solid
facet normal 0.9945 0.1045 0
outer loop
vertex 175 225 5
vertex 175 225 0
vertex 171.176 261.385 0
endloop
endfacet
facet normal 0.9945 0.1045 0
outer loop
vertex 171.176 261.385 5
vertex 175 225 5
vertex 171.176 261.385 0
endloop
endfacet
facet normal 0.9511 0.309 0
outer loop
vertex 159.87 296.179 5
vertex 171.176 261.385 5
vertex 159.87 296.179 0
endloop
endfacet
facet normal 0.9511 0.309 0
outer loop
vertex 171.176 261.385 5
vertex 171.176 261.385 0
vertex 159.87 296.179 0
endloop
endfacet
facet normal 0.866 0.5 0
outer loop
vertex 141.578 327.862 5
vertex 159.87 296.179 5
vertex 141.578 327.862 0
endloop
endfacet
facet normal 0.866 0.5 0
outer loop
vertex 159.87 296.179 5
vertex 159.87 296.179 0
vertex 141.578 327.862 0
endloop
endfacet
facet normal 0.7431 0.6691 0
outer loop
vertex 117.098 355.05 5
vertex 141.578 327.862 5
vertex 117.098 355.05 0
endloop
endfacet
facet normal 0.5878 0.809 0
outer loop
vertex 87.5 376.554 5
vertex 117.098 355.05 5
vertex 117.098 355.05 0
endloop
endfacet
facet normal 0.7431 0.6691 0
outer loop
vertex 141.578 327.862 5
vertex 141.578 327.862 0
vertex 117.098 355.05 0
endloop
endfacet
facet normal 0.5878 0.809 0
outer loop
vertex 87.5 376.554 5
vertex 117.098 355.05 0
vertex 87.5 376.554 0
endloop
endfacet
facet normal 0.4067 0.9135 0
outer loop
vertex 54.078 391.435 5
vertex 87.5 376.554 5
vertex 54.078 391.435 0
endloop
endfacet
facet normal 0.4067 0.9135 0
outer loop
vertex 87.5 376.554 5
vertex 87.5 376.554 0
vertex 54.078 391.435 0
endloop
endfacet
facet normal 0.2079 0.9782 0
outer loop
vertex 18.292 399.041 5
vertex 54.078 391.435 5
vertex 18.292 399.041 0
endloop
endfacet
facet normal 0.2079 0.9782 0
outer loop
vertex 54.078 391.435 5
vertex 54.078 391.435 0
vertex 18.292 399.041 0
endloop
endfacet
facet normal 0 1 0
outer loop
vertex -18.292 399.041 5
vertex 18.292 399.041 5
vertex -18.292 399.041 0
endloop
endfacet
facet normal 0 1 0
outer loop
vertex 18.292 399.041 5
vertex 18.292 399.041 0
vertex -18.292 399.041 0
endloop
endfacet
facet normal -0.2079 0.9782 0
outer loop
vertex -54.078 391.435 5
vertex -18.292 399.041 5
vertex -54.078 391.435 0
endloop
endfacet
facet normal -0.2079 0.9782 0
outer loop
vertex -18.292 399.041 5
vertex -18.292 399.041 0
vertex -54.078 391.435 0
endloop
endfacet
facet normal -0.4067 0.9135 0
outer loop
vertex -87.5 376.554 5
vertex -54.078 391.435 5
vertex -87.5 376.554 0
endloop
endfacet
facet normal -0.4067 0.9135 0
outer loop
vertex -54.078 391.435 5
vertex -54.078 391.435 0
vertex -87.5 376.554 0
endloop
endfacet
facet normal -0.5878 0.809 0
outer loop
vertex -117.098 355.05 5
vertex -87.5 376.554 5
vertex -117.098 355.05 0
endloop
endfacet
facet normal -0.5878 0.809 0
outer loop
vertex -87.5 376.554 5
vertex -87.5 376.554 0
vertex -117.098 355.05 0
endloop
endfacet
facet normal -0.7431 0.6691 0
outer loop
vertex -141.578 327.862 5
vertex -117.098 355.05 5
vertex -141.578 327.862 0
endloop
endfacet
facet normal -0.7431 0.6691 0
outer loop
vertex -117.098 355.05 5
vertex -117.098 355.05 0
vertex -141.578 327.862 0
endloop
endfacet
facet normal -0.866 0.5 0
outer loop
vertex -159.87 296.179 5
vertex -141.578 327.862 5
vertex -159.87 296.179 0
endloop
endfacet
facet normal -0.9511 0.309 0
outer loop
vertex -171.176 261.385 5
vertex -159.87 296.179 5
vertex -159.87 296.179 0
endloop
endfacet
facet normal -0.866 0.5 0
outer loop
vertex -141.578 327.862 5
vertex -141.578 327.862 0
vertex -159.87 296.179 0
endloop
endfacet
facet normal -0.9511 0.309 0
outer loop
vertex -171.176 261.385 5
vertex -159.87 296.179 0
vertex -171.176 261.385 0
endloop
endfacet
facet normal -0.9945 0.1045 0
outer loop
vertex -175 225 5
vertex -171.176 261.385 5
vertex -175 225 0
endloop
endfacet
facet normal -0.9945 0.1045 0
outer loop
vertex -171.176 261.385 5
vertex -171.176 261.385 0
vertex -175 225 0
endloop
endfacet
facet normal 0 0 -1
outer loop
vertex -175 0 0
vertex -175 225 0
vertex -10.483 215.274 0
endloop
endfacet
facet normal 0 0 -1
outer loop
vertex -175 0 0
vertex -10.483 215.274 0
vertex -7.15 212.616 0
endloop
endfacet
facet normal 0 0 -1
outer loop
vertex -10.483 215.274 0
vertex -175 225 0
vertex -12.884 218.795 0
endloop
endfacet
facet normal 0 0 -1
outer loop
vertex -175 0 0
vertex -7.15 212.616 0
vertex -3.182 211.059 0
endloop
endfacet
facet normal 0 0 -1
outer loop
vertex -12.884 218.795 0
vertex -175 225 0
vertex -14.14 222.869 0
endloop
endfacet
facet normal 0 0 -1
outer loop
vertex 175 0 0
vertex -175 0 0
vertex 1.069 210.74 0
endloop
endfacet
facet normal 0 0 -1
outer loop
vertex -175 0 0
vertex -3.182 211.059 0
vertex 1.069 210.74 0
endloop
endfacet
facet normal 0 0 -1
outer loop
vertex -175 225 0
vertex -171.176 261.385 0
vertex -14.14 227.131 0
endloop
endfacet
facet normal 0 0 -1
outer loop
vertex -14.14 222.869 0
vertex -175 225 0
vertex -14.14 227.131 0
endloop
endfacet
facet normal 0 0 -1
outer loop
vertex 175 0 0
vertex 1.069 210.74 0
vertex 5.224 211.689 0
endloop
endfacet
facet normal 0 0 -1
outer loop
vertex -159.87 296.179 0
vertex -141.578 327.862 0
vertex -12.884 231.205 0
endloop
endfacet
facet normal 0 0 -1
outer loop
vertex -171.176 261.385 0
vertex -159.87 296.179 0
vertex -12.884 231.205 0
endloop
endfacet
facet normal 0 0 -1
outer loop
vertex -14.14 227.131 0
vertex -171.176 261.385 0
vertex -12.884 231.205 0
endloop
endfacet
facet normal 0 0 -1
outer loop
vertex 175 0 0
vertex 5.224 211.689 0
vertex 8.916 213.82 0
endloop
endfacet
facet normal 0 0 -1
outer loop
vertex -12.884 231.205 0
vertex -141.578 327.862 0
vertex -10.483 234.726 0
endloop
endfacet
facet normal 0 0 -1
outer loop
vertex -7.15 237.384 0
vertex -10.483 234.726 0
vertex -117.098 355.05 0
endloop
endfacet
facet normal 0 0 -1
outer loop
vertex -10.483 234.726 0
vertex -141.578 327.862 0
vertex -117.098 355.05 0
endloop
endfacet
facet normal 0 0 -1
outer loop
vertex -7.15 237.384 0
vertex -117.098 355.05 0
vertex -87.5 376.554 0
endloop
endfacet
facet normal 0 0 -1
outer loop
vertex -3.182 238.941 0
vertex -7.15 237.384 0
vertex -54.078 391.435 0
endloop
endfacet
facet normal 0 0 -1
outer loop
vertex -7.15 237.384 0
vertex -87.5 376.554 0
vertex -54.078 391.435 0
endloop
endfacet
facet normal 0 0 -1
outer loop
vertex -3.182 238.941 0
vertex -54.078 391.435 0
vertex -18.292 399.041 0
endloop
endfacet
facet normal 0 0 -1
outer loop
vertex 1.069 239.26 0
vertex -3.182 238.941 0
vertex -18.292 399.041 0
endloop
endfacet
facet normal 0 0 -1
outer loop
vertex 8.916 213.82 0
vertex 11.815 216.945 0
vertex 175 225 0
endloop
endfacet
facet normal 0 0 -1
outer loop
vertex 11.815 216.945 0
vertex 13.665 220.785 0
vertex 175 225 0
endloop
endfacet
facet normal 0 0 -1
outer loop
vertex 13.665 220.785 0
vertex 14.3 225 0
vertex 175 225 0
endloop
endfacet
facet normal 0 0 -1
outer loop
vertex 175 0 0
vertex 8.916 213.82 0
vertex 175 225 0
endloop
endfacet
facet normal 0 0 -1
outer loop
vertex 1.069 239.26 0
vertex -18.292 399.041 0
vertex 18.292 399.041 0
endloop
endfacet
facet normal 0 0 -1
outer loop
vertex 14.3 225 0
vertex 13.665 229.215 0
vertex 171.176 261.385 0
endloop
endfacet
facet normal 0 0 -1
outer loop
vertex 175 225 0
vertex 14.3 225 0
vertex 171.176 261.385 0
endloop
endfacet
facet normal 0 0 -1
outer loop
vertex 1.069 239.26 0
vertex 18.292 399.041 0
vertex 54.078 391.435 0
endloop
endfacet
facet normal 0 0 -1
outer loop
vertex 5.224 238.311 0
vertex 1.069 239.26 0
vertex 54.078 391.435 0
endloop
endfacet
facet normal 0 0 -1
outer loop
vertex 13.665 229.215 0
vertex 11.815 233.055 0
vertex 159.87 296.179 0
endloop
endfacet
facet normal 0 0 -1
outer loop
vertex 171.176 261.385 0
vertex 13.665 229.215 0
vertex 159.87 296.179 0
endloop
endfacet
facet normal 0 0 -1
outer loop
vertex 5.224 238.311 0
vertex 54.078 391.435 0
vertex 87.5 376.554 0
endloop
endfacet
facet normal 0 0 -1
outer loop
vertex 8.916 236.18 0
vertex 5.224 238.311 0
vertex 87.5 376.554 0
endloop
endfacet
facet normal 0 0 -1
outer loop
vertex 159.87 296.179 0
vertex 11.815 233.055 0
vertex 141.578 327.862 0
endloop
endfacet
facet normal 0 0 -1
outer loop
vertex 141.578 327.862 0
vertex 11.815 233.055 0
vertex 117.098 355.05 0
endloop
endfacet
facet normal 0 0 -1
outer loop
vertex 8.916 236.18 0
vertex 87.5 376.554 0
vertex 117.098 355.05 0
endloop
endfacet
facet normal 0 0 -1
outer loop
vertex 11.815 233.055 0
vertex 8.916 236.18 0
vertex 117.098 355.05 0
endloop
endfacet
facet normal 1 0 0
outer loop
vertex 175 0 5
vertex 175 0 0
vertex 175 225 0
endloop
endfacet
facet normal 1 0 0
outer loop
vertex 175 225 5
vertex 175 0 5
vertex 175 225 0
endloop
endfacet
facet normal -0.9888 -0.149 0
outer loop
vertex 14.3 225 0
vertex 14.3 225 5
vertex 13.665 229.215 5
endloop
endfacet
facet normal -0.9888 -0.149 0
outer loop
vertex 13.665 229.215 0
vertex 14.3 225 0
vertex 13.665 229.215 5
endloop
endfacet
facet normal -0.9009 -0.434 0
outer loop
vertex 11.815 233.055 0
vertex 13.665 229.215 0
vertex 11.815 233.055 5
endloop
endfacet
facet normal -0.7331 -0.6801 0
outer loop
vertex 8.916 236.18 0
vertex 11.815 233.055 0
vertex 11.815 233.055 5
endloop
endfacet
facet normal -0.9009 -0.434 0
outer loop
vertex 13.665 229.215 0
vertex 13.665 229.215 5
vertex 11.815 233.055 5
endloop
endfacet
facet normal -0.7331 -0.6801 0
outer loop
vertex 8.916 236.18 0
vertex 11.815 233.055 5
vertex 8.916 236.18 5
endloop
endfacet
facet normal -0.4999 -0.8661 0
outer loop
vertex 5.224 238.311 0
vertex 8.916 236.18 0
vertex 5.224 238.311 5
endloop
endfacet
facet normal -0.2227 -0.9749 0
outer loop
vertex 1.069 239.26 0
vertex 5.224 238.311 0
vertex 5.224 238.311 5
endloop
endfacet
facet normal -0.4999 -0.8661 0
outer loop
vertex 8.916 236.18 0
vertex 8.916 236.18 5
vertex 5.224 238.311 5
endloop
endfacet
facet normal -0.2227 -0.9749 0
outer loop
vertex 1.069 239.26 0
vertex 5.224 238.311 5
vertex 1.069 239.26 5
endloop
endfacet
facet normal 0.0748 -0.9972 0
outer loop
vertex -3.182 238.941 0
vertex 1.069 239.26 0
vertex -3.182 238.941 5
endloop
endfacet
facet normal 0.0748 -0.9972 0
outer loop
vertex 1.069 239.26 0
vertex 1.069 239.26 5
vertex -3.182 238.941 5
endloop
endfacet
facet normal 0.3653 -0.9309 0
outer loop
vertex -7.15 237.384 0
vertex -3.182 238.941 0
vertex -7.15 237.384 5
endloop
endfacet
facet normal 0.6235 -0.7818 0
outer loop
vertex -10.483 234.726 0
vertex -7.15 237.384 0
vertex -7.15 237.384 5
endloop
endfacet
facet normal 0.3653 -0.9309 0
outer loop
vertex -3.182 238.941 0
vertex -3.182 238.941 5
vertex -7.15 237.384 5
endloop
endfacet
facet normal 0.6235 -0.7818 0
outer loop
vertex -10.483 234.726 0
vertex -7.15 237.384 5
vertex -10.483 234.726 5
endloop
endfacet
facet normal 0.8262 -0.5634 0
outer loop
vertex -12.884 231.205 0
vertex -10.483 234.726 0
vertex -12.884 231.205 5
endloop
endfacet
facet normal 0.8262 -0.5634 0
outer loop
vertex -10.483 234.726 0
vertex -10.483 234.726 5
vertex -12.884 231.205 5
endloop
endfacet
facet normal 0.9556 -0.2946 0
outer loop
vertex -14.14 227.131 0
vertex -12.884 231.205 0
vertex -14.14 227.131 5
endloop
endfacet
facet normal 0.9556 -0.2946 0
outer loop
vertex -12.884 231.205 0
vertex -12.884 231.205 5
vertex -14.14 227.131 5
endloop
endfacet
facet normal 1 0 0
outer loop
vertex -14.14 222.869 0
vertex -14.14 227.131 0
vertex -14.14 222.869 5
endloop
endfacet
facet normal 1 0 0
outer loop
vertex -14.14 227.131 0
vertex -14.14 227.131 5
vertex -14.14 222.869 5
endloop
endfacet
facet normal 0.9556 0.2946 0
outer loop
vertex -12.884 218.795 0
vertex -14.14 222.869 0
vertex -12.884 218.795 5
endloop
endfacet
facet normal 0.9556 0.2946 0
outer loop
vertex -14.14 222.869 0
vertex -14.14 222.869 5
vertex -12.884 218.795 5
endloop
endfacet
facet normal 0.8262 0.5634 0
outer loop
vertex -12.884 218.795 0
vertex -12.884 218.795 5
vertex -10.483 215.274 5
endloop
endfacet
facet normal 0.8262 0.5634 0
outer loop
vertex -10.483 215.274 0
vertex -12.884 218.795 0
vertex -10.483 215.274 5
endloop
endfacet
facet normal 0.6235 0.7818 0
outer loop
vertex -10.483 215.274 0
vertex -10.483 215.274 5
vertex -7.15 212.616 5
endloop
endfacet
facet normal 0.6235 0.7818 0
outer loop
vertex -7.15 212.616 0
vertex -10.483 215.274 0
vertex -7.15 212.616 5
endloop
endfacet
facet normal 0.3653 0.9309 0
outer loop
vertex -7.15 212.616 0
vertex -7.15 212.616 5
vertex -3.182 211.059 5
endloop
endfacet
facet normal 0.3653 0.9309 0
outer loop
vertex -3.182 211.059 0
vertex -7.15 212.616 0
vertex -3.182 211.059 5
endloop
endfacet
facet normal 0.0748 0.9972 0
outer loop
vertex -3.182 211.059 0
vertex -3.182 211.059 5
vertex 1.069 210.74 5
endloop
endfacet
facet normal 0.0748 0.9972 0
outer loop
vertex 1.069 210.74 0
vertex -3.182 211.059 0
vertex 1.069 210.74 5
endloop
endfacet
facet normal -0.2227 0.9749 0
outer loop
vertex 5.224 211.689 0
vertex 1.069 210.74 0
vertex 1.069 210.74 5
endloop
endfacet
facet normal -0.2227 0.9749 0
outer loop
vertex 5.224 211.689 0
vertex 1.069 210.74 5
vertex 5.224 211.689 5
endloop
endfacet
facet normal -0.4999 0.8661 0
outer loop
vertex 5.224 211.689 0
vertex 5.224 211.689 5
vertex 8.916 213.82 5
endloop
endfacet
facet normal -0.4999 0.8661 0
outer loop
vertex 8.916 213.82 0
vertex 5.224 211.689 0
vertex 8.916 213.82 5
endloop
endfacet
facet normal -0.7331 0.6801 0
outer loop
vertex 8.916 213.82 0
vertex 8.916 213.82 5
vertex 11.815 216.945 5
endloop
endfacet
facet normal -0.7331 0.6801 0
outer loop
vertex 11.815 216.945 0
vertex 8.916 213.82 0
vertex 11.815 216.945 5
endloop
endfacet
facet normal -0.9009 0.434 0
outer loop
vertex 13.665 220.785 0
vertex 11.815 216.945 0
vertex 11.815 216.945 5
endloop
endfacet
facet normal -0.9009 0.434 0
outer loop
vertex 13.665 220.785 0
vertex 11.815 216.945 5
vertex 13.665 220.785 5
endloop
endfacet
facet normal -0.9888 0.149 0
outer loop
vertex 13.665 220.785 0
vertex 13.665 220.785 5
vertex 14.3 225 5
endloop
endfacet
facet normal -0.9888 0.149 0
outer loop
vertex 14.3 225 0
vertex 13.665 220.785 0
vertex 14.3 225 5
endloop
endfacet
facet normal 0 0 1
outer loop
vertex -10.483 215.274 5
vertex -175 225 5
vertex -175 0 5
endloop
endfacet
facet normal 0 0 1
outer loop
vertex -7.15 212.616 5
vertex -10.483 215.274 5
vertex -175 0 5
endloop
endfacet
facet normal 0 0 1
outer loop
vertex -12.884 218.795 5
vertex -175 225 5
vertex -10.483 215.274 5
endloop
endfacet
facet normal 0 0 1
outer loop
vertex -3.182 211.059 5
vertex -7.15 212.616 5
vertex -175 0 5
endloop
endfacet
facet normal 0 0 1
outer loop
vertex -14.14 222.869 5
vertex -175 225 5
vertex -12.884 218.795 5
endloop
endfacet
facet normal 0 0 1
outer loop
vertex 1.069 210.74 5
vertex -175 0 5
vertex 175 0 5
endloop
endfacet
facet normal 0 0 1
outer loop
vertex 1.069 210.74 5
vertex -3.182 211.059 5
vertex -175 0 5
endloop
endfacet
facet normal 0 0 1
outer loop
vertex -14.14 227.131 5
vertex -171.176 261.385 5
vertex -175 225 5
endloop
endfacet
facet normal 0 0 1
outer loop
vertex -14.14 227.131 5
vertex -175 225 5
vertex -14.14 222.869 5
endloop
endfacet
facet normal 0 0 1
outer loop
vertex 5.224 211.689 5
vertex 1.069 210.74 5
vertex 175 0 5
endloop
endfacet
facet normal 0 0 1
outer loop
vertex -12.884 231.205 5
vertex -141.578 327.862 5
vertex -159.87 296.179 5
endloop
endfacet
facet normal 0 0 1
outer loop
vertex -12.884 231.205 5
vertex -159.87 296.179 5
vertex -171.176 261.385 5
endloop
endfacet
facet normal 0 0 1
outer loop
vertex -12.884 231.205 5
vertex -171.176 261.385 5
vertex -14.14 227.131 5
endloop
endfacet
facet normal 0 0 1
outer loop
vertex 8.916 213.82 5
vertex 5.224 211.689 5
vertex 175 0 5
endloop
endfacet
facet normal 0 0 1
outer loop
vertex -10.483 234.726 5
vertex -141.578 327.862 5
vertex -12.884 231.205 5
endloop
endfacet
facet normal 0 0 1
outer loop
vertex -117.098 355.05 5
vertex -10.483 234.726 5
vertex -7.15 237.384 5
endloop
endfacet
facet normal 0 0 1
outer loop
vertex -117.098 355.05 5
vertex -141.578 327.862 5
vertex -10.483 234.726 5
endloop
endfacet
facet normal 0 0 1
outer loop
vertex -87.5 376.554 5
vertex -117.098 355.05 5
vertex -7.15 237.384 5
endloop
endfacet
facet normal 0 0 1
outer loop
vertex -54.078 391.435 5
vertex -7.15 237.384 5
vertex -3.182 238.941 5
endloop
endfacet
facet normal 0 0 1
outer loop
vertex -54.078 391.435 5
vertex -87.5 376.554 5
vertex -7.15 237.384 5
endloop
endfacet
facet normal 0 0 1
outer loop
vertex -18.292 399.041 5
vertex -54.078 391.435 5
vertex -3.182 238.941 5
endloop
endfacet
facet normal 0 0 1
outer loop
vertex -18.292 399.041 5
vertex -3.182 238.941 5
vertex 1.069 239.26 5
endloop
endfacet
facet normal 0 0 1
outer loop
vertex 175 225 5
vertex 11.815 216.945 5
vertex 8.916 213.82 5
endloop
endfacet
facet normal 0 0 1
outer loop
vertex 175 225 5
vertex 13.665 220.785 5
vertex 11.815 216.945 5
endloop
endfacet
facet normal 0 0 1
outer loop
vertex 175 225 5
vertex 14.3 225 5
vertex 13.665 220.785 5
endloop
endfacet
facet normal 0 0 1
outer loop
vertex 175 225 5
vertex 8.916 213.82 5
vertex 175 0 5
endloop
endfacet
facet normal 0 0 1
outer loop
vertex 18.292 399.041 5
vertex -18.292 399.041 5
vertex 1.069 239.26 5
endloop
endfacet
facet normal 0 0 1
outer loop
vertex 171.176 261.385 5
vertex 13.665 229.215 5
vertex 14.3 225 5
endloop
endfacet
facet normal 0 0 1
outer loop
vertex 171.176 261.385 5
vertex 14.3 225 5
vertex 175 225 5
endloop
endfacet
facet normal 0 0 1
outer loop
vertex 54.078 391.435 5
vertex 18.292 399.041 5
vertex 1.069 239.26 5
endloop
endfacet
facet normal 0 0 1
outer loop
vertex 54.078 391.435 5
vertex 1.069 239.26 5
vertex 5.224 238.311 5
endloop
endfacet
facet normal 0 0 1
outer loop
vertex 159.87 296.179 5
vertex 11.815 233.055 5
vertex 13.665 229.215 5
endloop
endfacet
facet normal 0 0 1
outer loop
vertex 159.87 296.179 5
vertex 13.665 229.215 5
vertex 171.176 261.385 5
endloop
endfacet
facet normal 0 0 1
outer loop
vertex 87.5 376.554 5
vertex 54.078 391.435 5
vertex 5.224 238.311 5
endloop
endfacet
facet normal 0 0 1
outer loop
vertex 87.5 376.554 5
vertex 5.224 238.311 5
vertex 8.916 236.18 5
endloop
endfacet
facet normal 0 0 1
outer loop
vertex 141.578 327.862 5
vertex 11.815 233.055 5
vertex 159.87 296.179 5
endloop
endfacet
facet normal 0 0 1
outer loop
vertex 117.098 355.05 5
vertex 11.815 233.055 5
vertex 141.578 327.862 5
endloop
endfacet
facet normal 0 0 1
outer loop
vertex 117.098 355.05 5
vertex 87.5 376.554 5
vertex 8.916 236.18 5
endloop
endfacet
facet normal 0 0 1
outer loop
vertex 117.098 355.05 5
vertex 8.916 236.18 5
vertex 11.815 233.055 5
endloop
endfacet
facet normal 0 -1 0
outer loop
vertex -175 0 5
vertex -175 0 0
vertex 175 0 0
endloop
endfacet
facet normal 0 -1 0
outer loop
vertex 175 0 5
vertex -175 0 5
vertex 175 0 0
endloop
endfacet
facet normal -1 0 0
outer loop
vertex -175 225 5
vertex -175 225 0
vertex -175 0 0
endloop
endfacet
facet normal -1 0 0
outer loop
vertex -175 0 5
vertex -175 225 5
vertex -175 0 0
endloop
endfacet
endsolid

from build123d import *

# Parameters (mm, degrees)
OUTER_CASING_DEPTH = 5
SKETCH1_R          = 14.3
INNER_CUTOUT_DEPTH = 10


with BuildPart() as part:
    # Plate shape → Outer casing (new body)
    with BuildSketch(Plane.XY):
        with BuildLine():
            Line((-175, 225), (-175, 0))
            Line((-175, 0), (175, 0))
            Line((175, 0), (175, 225))
            ThreePointArc((175, 225), (0, 400), (-175, 225))
        make_face()
    extrude(amount=OUTER_CASING_DEPTH)

    # Sketch1 → Inner Cutout (cut)
    with BuildSketch(Plane.XY.offset(5)):
        with Locations((0, 225)):
            Circle(SKETCH1_R)
    extrude(amount=-INNER_CUTOUT_DEPTH, mode=Mode.SUBTRACT)


solid = part.part
